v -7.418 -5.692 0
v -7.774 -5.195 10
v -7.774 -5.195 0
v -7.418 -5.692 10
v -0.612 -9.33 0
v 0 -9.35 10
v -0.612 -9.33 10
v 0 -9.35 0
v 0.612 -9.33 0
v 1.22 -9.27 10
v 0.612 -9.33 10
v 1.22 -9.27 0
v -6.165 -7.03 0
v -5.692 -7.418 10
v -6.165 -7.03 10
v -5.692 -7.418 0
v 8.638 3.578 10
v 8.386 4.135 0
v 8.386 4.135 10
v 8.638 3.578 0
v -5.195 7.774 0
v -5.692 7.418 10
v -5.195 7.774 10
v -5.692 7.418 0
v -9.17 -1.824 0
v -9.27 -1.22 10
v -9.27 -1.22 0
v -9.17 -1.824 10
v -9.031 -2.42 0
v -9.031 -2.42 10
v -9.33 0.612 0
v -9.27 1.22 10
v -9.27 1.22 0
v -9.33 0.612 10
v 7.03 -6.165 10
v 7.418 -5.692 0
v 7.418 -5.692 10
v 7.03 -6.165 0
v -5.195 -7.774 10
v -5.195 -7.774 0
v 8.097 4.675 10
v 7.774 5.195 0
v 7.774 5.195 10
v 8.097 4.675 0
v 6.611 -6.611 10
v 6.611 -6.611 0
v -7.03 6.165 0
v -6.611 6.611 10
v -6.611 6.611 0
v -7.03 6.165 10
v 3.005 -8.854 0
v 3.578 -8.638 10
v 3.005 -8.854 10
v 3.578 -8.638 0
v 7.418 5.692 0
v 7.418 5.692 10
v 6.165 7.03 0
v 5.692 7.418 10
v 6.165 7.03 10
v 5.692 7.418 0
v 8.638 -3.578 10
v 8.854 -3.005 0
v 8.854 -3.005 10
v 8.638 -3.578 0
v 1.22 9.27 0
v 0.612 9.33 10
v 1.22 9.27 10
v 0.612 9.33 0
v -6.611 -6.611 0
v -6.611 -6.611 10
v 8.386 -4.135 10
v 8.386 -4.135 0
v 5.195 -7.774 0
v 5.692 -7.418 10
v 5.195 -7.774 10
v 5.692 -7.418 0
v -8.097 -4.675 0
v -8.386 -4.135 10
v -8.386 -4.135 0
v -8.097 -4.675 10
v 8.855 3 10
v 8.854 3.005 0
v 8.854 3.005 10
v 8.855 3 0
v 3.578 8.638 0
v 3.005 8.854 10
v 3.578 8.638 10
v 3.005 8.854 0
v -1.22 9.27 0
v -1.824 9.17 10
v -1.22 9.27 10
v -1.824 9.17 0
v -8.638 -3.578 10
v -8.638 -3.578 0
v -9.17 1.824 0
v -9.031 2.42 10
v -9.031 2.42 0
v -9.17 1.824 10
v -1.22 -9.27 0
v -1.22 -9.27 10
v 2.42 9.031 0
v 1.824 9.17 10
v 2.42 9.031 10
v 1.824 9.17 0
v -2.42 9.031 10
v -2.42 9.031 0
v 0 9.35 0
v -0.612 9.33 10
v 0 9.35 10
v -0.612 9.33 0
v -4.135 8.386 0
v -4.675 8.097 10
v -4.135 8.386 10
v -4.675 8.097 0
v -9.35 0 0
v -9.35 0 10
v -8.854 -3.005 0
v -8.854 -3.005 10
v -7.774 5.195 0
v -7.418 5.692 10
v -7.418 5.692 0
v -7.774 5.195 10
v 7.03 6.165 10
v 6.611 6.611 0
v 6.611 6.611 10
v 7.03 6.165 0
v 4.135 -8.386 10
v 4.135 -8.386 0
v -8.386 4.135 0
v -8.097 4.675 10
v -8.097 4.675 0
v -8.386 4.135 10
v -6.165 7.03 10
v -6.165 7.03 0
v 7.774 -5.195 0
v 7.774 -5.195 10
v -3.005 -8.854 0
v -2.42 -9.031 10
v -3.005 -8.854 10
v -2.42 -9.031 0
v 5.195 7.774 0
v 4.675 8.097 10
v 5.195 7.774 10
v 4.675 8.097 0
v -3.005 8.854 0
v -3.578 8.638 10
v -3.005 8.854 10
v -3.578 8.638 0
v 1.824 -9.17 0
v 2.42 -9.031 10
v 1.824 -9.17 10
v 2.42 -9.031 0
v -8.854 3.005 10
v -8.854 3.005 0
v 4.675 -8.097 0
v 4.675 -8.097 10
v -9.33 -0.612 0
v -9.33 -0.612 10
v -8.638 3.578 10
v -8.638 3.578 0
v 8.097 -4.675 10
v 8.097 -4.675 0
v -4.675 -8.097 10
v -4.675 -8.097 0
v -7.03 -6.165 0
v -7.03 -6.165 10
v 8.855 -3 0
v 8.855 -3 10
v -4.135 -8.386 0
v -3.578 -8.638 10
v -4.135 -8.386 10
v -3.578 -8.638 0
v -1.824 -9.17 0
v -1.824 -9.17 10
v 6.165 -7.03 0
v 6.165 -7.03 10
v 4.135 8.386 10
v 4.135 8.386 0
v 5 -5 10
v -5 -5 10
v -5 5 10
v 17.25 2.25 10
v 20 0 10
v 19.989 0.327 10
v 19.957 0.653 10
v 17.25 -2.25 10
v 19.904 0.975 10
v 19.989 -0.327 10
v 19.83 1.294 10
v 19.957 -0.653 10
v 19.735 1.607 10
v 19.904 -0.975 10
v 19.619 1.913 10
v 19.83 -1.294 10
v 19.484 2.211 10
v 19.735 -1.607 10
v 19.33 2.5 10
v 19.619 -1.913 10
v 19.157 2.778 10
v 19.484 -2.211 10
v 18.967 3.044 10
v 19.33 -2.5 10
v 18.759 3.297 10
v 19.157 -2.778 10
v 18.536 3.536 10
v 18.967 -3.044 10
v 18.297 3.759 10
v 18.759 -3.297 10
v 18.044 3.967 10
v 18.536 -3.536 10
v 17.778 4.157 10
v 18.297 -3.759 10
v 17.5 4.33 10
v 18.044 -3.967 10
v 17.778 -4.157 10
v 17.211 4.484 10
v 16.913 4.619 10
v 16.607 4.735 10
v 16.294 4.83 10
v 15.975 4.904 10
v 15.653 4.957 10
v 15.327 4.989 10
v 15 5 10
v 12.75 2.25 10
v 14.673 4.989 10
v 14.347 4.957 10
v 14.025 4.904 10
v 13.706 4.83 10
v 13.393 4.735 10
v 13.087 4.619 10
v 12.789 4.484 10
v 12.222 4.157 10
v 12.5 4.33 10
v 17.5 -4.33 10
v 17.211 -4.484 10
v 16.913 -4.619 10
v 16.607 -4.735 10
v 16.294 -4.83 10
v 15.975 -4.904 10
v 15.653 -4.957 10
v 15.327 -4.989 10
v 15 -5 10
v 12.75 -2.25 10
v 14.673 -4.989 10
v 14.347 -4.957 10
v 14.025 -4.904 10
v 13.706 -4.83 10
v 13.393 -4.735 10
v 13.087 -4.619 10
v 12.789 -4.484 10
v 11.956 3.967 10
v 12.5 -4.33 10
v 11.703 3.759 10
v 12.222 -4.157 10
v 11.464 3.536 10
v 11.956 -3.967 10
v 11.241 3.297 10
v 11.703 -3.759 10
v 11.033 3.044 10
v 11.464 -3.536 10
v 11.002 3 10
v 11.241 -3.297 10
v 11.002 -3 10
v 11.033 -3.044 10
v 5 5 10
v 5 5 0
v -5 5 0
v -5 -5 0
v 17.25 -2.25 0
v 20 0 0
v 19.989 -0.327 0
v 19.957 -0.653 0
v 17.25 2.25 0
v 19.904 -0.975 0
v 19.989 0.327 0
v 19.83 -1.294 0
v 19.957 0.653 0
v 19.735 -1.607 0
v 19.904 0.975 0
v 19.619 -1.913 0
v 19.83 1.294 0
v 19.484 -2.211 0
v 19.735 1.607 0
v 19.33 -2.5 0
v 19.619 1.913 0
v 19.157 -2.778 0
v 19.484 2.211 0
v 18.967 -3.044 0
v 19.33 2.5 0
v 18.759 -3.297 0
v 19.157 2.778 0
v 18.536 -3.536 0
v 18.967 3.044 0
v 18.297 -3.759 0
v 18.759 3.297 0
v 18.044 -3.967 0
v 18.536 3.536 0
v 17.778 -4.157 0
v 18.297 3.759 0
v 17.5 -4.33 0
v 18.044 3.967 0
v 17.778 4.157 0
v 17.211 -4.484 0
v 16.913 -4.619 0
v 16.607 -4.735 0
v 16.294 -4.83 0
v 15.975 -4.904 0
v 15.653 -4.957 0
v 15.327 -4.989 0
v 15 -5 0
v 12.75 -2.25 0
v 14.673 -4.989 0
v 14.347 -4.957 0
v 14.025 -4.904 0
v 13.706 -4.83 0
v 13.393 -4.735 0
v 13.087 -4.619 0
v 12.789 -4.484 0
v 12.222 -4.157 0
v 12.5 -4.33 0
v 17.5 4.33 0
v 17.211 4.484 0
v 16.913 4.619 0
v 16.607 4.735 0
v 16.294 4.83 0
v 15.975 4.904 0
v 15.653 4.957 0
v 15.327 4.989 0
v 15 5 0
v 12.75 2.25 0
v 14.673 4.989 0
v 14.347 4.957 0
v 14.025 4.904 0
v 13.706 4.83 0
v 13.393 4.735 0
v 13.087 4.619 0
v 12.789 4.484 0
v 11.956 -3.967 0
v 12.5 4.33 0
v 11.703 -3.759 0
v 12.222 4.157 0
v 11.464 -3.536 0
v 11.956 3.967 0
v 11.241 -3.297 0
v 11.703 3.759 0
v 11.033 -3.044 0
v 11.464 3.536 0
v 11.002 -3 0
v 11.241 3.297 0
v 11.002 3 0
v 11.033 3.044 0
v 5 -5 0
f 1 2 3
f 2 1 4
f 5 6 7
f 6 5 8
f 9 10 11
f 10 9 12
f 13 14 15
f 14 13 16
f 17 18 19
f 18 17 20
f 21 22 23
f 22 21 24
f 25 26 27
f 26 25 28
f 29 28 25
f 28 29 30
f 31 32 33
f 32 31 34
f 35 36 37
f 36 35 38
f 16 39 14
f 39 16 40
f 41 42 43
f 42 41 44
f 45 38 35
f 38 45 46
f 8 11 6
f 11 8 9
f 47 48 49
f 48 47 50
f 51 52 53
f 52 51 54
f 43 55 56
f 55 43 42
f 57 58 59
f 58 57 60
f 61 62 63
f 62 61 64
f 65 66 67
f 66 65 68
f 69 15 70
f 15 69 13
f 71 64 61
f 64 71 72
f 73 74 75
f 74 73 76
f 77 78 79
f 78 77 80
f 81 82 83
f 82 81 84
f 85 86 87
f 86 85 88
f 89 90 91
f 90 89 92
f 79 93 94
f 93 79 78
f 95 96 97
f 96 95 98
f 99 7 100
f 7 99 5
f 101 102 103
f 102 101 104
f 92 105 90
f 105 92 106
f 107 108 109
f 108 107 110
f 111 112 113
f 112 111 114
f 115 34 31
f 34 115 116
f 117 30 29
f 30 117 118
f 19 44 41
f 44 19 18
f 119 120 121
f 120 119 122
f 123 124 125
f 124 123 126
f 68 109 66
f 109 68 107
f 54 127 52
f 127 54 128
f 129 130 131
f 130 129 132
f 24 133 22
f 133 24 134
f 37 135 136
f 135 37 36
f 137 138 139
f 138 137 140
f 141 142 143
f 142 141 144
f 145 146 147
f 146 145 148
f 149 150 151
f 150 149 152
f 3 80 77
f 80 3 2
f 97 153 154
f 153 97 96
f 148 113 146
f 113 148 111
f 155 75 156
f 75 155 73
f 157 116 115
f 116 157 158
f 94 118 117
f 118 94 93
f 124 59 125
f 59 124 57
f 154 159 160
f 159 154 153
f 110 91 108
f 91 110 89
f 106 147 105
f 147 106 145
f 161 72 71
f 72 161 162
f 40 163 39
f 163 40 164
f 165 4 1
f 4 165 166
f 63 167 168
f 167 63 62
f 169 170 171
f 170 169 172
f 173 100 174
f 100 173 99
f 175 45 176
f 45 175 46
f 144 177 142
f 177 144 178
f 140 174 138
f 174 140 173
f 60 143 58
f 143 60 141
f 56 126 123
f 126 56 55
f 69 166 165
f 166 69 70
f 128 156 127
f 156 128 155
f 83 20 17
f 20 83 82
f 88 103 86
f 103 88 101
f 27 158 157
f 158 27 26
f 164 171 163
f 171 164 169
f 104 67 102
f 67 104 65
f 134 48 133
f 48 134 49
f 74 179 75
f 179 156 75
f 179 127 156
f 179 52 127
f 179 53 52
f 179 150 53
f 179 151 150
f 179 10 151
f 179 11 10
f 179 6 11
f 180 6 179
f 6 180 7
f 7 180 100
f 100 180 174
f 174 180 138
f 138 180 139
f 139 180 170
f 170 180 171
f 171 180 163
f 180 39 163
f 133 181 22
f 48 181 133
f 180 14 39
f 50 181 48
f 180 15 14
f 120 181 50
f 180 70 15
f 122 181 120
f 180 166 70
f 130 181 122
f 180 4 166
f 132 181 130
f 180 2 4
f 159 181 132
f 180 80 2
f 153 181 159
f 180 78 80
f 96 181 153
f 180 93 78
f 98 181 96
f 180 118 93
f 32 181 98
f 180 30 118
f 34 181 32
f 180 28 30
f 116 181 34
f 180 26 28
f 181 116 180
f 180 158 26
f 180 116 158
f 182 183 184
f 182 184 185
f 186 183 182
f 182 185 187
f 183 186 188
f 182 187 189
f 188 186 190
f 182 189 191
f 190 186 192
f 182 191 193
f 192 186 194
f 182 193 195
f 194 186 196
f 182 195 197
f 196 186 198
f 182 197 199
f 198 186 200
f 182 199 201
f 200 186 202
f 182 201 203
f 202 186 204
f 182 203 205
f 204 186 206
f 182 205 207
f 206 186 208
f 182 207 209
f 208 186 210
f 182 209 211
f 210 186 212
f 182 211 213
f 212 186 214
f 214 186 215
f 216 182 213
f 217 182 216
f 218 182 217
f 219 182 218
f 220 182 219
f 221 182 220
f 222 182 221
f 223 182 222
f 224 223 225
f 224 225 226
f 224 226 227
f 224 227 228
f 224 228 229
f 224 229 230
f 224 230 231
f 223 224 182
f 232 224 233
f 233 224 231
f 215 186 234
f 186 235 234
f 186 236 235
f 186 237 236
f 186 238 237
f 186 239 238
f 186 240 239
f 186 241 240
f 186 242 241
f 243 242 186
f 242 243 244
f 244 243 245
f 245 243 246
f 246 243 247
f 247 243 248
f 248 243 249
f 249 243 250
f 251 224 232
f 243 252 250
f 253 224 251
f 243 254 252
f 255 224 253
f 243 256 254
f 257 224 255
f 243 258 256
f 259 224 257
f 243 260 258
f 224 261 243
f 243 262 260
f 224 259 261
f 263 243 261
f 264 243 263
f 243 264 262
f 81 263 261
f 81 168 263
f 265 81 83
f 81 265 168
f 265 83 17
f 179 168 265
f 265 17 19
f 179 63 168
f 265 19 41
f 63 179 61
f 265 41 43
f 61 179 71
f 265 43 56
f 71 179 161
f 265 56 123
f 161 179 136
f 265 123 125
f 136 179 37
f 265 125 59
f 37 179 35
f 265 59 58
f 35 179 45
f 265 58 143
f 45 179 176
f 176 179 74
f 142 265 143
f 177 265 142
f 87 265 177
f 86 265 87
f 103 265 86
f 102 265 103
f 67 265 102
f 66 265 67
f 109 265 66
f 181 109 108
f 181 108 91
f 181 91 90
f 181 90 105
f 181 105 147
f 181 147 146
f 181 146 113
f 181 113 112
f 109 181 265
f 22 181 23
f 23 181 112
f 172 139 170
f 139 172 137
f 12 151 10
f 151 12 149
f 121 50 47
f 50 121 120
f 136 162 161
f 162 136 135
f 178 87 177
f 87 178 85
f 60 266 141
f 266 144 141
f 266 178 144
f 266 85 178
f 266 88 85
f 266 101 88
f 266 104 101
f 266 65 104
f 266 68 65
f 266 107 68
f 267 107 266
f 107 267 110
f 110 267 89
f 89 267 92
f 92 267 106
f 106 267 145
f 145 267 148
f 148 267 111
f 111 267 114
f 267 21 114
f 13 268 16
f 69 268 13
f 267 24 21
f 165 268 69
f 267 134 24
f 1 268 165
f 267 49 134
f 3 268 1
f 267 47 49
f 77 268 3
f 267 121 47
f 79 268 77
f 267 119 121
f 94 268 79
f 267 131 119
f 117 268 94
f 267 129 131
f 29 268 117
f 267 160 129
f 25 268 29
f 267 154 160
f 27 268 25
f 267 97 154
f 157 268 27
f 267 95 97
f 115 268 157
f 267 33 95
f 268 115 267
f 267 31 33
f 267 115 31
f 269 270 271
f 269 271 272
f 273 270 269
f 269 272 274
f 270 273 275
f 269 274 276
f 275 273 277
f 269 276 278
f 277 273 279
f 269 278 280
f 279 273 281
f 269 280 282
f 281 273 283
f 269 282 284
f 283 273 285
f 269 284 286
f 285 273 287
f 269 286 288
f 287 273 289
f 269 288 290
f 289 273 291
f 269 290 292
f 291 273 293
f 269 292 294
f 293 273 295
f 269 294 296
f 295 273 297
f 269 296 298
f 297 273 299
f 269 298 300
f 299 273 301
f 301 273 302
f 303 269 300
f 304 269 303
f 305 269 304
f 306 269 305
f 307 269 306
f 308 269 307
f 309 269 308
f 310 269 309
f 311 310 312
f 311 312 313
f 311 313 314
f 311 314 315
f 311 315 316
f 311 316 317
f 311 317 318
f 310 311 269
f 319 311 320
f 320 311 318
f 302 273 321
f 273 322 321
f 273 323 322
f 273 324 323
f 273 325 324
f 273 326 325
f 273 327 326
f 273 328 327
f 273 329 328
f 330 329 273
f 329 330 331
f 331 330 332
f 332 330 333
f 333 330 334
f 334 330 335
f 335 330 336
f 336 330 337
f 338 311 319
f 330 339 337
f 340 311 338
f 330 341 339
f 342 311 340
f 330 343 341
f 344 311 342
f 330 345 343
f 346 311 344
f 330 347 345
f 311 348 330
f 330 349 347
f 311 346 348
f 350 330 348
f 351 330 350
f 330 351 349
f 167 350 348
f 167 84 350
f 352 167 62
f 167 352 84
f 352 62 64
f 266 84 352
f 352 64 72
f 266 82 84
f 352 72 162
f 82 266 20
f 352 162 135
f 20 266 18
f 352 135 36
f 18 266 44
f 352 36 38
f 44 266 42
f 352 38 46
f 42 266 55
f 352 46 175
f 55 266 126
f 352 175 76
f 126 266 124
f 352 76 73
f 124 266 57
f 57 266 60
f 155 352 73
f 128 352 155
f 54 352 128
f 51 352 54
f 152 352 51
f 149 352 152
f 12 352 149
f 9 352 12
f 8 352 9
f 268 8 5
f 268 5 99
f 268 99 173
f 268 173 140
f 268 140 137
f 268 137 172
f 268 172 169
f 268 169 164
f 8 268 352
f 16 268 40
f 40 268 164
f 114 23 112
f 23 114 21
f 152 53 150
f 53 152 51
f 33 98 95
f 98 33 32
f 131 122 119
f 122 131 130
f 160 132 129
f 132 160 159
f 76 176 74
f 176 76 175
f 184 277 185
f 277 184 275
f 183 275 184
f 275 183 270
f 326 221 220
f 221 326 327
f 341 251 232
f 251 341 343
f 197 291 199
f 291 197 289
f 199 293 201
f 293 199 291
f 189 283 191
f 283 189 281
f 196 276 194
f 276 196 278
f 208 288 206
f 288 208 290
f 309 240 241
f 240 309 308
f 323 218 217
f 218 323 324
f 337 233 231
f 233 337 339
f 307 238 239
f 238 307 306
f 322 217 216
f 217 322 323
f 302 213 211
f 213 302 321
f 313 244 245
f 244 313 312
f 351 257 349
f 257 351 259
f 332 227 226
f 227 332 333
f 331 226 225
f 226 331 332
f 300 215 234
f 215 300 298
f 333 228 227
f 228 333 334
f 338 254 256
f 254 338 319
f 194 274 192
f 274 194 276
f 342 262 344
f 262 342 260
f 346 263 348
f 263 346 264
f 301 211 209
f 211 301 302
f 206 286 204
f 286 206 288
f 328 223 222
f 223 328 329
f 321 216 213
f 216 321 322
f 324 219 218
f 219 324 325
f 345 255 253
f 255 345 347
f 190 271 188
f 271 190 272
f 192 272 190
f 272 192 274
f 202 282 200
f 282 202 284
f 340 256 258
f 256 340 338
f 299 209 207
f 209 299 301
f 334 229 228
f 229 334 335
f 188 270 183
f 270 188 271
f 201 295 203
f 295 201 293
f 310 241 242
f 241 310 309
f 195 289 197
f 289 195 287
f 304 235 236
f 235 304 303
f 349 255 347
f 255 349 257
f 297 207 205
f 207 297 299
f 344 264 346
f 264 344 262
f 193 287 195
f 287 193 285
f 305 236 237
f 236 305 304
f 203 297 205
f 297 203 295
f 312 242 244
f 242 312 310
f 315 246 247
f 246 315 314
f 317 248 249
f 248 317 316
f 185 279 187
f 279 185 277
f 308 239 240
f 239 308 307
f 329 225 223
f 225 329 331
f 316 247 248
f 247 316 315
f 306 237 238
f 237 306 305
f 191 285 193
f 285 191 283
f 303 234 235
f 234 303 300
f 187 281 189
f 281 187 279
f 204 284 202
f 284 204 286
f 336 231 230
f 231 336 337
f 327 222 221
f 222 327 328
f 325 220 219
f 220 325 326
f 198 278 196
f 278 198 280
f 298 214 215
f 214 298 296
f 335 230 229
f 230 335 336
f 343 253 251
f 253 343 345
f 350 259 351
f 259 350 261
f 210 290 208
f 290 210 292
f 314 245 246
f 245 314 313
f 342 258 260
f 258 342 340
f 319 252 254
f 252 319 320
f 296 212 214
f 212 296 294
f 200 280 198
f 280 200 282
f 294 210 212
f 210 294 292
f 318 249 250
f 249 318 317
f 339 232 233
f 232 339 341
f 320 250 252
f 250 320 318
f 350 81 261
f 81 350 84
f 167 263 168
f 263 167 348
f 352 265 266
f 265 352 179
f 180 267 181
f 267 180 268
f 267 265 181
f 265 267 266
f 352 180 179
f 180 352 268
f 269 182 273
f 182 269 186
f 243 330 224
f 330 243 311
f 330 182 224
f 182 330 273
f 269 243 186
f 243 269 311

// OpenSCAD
// Tubing clip for 12.7 mm lab stand rod
// Print orientation: flat on bed, extruded in +Z

// ---- Stand rod ring ----
stand_d      = 12.7;   // stand rod diameter
stand_wall   = 3;      // ring wall thickness
stand_od     = stand_d + 2 * stand_wall; // 18.7 mm outer diameter
stand_open   = 10;     // opening width on -X side

// ---- Tubing ring ----
tube_d       = 6;      // tubing inner diameter
tube_wall    = 2;      // ring wall thickness
tube_od      = tube_d + 2 * tube_wall;   // 10 mm outer diameter
tube_x       = 15;     // ring centre X
tube_open    = 4.5;    // opening width on +X side

// ---- Bridge ----
bridge_w     = 6;      // bridge width in Y
bridge_x0    = 8;      // bridge start X
bridge_x1    = 12;     // bridge end X

// ---- Misc ----
eps          = 0.5;    // cutter overshoot
$fn          = 96;

difference() {
    union() {
        // Stand rod ring
        translate([0, 0, 0])
            cylinder(d = stand_od, h = 10);
        // Tubing ring
        translate([tube_x, 0, 0])
            cylinder(d = tube_od, h = 10);
        // Bridge
        translate([bridge_x0, -bridge_w / 2, 0])
            cube([bridge_x1 - bridge_x0, bridge_w, 10]);
    }
    // Stand rod opening
    translate([-stand_open / 2, -stand_open / 2, -eps])
        cube([stand_open, stand_open, 10 + 2 * eps]);
    // Tubing opening
    translate([tube_x - tube_open / 2, -tube_open / 2, -eps])
        cube([tube_open, tube_open, 10 + 2 * eps]);
}
